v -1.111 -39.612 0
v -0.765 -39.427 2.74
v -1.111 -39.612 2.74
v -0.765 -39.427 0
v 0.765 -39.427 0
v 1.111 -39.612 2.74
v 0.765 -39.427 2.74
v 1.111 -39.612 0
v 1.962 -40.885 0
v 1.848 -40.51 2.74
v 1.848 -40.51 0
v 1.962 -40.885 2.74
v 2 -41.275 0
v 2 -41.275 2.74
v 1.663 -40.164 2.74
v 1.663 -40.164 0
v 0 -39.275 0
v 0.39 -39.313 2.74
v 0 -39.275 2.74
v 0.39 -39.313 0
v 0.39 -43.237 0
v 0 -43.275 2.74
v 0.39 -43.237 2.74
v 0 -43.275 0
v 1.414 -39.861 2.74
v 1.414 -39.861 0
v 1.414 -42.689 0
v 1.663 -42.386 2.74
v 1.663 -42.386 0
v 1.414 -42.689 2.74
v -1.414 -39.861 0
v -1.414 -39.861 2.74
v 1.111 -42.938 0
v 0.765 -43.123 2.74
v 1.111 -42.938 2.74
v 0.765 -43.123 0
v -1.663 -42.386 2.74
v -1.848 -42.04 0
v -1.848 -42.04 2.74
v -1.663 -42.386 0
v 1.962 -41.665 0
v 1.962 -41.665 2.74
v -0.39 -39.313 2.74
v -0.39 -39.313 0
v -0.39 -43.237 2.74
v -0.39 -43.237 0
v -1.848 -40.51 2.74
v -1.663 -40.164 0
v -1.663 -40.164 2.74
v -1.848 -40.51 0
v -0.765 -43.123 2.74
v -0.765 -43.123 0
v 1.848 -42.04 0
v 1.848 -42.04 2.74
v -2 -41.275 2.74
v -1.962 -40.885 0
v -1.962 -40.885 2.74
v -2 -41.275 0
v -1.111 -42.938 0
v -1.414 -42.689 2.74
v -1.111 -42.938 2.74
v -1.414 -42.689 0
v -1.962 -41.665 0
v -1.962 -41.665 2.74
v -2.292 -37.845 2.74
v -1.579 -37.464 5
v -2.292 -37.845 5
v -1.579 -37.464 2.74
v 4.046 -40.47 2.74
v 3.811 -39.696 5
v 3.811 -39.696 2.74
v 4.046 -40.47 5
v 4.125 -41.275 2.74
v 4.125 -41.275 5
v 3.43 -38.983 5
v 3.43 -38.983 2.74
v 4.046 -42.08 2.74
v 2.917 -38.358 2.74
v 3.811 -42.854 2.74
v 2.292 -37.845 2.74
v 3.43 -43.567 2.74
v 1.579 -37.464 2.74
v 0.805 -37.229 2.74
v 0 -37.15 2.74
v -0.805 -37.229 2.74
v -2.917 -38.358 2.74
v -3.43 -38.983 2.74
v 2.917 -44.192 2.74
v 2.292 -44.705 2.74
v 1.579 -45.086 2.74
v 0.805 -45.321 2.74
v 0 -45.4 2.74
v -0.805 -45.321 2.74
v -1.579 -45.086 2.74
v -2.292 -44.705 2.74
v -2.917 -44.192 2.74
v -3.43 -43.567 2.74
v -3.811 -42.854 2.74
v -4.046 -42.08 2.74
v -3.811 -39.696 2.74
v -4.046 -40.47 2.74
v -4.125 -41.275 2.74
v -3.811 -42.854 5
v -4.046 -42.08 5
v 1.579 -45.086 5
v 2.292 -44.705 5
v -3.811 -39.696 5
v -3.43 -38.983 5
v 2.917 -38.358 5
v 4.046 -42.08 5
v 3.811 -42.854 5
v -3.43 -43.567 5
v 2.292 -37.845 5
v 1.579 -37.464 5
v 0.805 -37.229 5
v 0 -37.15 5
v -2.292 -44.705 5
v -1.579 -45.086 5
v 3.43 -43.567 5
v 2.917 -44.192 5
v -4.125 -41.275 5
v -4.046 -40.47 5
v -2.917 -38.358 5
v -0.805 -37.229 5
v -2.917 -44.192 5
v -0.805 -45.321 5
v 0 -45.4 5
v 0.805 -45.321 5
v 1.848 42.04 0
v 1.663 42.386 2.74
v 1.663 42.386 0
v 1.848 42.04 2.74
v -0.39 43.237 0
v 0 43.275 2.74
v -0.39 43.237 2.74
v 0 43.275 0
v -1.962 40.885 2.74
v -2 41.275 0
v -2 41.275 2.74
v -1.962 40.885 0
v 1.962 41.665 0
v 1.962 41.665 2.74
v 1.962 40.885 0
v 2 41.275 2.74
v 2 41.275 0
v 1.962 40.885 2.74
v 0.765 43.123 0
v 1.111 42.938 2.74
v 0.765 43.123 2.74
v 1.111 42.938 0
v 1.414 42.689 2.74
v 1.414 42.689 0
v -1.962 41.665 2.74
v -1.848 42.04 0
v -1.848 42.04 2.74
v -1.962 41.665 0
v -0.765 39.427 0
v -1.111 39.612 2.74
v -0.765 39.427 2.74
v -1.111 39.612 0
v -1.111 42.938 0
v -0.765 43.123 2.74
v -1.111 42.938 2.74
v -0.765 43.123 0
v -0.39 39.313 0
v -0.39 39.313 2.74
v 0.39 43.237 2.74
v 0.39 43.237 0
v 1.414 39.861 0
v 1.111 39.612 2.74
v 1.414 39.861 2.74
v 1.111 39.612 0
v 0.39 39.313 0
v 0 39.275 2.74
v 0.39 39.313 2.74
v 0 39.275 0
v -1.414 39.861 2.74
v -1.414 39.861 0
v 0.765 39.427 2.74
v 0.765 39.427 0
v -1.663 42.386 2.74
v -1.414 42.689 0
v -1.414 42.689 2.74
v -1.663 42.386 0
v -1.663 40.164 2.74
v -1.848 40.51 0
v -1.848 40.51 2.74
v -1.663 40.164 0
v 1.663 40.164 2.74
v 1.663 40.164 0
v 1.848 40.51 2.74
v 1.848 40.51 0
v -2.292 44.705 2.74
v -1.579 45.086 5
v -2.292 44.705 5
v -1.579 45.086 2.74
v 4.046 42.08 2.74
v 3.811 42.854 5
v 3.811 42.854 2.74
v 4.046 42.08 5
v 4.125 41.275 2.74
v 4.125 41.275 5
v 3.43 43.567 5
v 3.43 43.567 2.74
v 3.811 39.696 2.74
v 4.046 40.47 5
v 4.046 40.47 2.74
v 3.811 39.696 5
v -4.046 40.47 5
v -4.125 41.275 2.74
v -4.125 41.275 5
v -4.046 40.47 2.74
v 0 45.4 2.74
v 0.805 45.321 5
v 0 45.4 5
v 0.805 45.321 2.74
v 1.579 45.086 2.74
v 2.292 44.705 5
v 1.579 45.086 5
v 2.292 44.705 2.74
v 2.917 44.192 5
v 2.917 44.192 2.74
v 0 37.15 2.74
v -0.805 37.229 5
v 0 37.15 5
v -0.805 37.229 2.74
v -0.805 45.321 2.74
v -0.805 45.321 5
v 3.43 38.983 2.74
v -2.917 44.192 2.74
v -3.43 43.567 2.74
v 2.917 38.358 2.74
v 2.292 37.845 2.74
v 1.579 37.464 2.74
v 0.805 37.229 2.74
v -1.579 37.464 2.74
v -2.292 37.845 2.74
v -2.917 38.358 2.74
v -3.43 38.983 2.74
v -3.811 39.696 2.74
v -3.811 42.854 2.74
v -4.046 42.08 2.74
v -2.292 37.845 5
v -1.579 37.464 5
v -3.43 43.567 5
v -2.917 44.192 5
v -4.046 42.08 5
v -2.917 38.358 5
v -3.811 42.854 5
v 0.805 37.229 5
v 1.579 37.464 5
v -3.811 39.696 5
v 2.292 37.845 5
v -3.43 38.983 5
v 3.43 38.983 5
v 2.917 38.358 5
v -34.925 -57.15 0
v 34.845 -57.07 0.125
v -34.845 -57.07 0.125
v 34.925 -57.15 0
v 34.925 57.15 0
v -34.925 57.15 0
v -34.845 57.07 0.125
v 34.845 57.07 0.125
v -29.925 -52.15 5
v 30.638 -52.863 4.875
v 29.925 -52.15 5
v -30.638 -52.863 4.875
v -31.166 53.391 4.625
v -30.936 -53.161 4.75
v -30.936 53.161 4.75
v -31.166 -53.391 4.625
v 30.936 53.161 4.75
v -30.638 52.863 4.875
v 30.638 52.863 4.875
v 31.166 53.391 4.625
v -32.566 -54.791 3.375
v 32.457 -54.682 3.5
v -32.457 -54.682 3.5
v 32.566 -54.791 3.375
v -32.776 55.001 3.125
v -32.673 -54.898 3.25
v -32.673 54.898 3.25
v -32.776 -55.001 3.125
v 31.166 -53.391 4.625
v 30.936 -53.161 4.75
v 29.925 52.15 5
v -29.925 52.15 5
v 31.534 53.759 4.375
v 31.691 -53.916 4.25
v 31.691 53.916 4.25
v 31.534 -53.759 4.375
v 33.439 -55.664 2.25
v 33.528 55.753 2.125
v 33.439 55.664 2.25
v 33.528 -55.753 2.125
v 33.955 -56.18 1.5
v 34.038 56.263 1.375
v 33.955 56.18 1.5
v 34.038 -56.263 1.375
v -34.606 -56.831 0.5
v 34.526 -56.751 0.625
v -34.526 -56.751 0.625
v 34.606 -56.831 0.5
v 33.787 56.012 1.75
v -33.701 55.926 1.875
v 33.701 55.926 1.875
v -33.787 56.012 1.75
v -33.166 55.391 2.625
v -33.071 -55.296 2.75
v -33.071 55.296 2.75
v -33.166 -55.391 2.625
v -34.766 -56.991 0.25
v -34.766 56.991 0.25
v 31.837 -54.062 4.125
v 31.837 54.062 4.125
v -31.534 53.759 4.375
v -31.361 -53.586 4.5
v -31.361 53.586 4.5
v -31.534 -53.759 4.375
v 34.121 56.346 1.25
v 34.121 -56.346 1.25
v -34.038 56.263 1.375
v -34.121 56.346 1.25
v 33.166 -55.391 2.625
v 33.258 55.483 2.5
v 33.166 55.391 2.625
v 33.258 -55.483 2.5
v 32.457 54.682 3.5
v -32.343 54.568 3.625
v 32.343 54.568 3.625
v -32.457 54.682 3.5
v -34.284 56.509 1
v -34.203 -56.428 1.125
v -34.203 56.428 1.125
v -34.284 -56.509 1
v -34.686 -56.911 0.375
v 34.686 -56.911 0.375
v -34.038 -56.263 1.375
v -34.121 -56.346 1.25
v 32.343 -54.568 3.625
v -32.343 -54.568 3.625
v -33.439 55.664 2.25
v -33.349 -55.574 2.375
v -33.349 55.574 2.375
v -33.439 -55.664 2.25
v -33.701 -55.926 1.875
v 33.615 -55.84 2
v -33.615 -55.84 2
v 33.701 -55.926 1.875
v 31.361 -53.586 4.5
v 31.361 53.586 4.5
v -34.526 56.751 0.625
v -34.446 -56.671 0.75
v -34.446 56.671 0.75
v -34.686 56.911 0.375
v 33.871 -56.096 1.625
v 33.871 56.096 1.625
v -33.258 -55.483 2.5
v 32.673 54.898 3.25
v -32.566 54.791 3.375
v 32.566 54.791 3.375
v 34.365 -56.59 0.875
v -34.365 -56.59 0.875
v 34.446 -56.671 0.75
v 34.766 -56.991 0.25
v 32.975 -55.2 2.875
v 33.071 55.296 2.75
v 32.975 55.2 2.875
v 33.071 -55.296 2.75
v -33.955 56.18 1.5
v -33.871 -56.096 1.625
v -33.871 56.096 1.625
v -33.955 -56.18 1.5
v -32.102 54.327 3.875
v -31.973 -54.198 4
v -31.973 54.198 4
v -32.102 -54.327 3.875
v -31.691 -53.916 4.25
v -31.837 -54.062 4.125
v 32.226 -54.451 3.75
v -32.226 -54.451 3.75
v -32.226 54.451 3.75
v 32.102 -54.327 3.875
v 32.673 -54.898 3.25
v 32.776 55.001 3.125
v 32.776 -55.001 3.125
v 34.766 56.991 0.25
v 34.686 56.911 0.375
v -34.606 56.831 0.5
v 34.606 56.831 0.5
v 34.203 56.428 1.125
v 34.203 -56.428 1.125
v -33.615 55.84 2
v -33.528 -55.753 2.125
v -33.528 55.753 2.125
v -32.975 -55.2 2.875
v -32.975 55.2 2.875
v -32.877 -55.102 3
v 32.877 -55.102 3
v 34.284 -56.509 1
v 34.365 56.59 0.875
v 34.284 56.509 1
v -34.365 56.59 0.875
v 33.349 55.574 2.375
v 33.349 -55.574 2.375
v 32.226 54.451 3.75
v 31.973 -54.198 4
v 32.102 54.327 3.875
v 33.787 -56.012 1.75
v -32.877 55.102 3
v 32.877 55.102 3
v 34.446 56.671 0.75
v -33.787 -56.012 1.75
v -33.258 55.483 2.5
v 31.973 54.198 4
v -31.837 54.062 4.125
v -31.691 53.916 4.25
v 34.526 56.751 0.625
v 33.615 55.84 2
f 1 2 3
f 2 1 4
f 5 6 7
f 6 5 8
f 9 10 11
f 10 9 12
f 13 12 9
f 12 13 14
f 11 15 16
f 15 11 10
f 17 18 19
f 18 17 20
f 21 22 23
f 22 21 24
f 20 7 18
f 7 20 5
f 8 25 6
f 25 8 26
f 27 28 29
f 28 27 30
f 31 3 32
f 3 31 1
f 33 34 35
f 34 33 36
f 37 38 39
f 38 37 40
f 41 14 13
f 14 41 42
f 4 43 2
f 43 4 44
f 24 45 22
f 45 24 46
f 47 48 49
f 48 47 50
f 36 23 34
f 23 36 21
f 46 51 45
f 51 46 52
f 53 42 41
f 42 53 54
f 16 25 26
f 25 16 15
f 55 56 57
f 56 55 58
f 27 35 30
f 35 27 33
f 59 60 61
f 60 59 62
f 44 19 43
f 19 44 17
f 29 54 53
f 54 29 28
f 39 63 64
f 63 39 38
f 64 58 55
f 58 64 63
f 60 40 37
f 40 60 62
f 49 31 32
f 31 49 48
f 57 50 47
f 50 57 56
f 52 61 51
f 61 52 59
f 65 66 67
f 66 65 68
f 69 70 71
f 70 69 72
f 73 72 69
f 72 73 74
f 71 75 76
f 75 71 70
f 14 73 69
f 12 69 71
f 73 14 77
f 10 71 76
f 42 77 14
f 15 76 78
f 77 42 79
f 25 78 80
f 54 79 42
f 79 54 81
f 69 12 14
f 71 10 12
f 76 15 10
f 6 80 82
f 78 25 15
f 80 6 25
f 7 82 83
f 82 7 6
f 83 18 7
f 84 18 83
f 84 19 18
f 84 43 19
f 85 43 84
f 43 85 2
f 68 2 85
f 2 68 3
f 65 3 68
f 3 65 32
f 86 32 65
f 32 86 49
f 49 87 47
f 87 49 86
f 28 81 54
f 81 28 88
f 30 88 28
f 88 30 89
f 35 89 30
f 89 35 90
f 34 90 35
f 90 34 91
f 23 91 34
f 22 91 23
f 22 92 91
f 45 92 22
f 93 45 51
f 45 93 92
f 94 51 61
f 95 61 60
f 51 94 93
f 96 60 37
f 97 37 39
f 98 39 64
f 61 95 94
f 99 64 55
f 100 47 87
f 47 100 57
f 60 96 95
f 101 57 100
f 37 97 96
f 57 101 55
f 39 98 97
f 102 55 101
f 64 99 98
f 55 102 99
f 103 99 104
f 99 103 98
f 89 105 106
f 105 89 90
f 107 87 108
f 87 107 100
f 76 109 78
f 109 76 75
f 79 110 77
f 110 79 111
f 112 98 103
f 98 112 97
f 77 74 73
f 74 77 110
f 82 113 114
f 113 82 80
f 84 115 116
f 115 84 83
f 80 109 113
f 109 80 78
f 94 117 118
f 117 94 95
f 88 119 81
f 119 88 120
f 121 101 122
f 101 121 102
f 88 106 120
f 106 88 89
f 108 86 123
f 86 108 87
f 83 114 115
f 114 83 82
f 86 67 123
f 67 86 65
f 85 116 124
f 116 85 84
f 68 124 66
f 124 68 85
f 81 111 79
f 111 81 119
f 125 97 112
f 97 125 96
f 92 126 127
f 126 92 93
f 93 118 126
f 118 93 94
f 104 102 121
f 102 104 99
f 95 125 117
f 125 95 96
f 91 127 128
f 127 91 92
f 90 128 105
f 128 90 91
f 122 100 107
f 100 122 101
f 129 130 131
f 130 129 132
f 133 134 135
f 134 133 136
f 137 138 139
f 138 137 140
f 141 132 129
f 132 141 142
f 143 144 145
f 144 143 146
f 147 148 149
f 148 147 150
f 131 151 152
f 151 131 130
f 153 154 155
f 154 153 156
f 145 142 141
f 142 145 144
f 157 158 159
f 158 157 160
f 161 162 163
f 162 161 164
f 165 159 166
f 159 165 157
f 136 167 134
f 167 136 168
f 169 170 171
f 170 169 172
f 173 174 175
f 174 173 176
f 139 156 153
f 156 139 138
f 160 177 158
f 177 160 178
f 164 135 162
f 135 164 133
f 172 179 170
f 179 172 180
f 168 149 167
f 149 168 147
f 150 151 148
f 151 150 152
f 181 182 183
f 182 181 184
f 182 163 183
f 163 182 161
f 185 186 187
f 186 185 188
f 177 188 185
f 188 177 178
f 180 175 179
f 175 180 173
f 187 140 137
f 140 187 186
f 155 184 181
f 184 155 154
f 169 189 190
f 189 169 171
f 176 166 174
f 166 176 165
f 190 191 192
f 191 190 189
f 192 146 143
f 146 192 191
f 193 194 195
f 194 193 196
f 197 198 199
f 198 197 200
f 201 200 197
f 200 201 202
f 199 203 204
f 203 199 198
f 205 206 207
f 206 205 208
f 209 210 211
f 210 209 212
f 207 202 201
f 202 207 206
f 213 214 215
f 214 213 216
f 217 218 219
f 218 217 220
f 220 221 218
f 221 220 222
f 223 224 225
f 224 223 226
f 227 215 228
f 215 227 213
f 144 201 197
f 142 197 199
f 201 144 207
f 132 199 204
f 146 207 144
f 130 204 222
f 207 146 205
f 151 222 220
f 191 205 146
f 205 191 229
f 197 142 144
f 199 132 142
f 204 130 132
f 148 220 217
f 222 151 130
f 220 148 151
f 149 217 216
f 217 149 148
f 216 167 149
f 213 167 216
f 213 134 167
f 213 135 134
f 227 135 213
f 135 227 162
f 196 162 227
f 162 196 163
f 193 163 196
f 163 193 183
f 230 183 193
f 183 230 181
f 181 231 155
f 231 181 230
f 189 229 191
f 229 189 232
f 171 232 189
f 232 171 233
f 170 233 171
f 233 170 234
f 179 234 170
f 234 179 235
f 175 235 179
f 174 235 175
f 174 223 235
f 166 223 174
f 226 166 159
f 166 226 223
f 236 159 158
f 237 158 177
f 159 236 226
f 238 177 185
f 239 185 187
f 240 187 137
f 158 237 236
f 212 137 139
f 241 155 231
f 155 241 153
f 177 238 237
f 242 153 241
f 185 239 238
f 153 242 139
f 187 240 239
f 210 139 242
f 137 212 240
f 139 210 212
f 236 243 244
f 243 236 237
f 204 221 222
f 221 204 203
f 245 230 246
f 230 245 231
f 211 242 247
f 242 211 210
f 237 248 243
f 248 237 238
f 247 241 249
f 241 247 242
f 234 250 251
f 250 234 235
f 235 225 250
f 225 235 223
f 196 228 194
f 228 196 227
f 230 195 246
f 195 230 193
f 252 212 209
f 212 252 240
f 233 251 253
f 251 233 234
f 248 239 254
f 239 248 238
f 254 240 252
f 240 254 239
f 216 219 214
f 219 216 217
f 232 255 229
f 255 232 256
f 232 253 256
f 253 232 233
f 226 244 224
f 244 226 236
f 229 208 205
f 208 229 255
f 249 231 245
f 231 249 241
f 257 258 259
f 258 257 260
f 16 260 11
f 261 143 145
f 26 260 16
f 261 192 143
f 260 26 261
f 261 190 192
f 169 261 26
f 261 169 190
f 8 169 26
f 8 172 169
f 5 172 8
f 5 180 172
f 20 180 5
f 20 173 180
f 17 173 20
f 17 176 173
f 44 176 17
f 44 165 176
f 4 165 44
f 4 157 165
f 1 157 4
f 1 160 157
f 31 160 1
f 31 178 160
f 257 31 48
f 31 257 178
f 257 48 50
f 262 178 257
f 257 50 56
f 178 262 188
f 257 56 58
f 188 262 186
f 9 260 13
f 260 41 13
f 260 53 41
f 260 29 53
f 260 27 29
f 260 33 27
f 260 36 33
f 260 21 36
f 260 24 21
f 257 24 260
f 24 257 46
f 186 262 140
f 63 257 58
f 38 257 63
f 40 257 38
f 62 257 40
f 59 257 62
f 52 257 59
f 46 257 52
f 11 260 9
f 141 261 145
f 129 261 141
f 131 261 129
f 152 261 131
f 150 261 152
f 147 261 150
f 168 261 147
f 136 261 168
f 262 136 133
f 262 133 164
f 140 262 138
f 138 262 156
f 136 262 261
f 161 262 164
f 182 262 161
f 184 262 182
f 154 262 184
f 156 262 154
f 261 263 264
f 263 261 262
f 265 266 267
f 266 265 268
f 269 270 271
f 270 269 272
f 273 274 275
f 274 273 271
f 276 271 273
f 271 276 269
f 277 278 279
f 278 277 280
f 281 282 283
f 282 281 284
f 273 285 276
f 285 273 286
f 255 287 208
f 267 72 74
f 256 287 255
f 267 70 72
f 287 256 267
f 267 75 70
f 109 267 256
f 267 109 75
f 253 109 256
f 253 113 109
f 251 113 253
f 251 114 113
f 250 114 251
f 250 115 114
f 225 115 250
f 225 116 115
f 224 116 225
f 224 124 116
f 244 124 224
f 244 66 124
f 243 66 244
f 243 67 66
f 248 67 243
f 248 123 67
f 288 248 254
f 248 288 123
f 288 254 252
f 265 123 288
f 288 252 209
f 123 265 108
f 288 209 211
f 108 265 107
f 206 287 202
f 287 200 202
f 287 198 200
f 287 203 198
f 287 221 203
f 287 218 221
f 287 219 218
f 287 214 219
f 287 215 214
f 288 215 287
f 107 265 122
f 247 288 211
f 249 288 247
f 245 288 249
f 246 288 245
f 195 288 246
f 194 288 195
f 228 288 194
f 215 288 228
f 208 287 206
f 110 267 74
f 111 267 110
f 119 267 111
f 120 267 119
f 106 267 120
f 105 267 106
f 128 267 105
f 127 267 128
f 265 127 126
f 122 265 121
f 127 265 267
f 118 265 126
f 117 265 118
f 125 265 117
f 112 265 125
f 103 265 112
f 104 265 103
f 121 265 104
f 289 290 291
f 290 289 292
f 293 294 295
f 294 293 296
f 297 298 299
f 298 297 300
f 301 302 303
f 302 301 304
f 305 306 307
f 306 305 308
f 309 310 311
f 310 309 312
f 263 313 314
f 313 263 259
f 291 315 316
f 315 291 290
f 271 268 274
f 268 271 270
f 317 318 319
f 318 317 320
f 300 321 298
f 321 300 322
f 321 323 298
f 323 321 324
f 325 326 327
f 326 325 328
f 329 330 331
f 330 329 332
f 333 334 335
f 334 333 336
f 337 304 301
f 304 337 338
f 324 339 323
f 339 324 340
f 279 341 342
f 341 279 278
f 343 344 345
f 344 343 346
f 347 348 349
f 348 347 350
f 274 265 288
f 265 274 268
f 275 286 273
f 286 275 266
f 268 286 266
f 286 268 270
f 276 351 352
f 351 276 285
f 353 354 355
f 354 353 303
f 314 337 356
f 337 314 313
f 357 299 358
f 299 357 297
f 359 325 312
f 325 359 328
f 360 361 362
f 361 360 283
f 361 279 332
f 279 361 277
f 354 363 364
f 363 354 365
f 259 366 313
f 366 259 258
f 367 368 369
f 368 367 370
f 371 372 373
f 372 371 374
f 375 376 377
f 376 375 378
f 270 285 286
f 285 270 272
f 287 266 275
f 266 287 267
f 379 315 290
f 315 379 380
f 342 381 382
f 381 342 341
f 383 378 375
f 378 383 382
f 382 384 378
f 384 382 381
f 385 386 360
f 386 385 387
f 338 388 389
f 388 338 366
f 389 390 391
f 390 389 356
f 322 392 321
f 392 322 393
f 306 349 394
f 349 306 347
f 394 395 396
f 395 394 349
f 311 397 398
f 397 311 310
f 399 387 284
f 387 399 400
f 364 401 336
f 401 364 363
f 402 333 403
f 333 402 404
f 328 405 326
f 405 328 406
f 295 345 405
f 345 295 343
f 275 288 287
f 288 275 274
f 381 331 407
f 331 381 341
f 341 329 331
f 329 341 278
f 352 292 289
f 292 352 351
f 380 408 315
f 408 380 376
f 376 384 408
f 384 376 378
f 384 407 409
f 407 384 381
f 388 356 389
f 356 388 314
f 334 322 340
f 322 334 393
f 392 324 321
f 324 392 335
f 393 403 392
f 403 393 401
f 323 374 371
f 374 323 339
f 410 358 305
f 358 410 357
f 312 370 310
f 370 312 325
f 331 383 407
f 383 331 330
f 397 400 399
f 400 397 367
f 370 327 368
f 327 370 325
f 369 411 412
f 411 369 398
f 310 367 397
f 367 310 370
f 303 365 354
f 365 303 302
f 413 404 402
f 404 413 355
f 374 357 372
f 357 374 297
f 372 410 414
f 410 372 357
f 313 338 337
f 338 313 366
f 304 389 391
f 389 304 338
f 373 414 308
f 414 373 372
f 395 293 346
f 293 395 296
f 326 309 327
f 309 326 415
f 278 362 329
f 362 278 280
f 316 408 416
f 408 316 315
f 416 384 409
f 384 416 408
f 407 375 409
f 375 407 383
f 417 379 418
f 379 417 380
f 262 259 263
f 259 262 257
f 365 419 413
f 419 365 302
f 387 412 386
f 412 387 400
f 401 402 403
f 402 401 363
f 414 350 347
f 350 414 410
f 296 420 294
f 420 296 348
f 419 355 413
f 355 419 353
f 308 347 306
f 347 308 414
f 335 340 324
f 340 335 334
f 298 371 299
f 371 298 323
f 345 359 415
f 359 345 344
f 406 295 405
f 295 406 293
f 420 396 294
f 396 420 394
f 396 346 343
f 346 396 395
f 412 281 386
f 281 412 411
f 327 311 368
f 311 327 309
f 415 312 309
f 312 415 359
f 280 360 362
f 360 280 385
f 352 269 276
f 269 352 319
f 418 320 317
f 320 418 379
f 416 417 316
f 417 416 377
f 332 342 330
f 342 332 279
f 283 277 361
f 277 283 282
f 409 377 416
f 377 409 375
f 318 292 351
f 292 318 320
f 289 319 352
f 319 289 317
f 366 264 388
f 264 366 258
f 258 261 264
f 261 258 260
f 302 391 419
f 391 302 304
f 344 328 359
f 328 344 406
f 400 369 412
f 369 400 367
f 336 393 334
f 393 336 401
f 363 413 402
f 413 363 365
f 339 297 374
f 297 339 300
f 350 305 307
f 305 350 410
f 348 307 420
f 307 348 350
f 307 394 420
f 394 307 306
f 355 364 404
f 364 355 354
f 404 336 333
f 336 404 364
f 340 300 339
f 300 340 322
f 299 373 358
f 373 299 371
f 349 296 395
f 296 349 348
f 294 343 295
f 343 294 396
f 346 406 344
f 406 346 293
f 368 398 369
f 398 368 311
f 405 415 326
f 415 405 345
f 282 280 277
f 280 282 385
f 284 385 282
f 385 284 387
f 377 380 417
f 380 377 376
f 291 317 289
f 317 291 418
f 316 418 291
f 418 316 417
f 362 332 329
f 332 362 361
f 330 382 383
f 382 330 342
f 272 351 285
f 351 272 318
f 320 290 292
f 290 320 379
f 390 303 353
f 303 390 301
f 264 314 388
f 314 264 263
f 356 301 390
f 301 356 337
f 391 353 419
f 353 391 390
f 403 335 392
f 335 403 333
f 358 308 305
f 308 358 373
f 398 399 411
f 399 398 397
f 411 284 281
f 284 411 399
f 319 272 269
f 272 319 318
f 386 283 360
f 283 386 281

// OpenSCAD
use <tubemesh.scad>;

//<params>
h = 114.3;
w = 69.85;
screwSpacing = 82.55;
thickness = 5;
taper = 5;
screwDiameter = 4;
screwHeadDiameter = 8.25;
screwHeadDepth = 2.25;
taperFormula = "asin(t)/90";
//</params>

module dummy() {}

nudge = 0.01;

slice0 = [ [ -w/2,-h/2 ],[ w/2,-h/2], [w/2,h/2], [-w/2,h/2]];
slice1 = [ [ -w/2+taper,-h/2+taper],[ w/2-taper,-h/2+taper], [w/2-taper,h/2-taper], [-w/2+taper,h/2-taper]];

$fn = 32;
difference() {
    morphExtrude(slice0,slice1,height=thickness,curve=taperFormula,numSlices=40);
    translate([0,0,-nudge])
    for (s=[-1,1]) {
        translate([0,s*screwSpacing/2,0]) {
        cylinder(d=screwDiameter,h=thickness+2*nudge);
        translate([0,0,thickness-screwHeadDepth]) cylinder(d=screwHeadDiameter,h=screwHeadDepth+nudge*2);
        }
    }
}
